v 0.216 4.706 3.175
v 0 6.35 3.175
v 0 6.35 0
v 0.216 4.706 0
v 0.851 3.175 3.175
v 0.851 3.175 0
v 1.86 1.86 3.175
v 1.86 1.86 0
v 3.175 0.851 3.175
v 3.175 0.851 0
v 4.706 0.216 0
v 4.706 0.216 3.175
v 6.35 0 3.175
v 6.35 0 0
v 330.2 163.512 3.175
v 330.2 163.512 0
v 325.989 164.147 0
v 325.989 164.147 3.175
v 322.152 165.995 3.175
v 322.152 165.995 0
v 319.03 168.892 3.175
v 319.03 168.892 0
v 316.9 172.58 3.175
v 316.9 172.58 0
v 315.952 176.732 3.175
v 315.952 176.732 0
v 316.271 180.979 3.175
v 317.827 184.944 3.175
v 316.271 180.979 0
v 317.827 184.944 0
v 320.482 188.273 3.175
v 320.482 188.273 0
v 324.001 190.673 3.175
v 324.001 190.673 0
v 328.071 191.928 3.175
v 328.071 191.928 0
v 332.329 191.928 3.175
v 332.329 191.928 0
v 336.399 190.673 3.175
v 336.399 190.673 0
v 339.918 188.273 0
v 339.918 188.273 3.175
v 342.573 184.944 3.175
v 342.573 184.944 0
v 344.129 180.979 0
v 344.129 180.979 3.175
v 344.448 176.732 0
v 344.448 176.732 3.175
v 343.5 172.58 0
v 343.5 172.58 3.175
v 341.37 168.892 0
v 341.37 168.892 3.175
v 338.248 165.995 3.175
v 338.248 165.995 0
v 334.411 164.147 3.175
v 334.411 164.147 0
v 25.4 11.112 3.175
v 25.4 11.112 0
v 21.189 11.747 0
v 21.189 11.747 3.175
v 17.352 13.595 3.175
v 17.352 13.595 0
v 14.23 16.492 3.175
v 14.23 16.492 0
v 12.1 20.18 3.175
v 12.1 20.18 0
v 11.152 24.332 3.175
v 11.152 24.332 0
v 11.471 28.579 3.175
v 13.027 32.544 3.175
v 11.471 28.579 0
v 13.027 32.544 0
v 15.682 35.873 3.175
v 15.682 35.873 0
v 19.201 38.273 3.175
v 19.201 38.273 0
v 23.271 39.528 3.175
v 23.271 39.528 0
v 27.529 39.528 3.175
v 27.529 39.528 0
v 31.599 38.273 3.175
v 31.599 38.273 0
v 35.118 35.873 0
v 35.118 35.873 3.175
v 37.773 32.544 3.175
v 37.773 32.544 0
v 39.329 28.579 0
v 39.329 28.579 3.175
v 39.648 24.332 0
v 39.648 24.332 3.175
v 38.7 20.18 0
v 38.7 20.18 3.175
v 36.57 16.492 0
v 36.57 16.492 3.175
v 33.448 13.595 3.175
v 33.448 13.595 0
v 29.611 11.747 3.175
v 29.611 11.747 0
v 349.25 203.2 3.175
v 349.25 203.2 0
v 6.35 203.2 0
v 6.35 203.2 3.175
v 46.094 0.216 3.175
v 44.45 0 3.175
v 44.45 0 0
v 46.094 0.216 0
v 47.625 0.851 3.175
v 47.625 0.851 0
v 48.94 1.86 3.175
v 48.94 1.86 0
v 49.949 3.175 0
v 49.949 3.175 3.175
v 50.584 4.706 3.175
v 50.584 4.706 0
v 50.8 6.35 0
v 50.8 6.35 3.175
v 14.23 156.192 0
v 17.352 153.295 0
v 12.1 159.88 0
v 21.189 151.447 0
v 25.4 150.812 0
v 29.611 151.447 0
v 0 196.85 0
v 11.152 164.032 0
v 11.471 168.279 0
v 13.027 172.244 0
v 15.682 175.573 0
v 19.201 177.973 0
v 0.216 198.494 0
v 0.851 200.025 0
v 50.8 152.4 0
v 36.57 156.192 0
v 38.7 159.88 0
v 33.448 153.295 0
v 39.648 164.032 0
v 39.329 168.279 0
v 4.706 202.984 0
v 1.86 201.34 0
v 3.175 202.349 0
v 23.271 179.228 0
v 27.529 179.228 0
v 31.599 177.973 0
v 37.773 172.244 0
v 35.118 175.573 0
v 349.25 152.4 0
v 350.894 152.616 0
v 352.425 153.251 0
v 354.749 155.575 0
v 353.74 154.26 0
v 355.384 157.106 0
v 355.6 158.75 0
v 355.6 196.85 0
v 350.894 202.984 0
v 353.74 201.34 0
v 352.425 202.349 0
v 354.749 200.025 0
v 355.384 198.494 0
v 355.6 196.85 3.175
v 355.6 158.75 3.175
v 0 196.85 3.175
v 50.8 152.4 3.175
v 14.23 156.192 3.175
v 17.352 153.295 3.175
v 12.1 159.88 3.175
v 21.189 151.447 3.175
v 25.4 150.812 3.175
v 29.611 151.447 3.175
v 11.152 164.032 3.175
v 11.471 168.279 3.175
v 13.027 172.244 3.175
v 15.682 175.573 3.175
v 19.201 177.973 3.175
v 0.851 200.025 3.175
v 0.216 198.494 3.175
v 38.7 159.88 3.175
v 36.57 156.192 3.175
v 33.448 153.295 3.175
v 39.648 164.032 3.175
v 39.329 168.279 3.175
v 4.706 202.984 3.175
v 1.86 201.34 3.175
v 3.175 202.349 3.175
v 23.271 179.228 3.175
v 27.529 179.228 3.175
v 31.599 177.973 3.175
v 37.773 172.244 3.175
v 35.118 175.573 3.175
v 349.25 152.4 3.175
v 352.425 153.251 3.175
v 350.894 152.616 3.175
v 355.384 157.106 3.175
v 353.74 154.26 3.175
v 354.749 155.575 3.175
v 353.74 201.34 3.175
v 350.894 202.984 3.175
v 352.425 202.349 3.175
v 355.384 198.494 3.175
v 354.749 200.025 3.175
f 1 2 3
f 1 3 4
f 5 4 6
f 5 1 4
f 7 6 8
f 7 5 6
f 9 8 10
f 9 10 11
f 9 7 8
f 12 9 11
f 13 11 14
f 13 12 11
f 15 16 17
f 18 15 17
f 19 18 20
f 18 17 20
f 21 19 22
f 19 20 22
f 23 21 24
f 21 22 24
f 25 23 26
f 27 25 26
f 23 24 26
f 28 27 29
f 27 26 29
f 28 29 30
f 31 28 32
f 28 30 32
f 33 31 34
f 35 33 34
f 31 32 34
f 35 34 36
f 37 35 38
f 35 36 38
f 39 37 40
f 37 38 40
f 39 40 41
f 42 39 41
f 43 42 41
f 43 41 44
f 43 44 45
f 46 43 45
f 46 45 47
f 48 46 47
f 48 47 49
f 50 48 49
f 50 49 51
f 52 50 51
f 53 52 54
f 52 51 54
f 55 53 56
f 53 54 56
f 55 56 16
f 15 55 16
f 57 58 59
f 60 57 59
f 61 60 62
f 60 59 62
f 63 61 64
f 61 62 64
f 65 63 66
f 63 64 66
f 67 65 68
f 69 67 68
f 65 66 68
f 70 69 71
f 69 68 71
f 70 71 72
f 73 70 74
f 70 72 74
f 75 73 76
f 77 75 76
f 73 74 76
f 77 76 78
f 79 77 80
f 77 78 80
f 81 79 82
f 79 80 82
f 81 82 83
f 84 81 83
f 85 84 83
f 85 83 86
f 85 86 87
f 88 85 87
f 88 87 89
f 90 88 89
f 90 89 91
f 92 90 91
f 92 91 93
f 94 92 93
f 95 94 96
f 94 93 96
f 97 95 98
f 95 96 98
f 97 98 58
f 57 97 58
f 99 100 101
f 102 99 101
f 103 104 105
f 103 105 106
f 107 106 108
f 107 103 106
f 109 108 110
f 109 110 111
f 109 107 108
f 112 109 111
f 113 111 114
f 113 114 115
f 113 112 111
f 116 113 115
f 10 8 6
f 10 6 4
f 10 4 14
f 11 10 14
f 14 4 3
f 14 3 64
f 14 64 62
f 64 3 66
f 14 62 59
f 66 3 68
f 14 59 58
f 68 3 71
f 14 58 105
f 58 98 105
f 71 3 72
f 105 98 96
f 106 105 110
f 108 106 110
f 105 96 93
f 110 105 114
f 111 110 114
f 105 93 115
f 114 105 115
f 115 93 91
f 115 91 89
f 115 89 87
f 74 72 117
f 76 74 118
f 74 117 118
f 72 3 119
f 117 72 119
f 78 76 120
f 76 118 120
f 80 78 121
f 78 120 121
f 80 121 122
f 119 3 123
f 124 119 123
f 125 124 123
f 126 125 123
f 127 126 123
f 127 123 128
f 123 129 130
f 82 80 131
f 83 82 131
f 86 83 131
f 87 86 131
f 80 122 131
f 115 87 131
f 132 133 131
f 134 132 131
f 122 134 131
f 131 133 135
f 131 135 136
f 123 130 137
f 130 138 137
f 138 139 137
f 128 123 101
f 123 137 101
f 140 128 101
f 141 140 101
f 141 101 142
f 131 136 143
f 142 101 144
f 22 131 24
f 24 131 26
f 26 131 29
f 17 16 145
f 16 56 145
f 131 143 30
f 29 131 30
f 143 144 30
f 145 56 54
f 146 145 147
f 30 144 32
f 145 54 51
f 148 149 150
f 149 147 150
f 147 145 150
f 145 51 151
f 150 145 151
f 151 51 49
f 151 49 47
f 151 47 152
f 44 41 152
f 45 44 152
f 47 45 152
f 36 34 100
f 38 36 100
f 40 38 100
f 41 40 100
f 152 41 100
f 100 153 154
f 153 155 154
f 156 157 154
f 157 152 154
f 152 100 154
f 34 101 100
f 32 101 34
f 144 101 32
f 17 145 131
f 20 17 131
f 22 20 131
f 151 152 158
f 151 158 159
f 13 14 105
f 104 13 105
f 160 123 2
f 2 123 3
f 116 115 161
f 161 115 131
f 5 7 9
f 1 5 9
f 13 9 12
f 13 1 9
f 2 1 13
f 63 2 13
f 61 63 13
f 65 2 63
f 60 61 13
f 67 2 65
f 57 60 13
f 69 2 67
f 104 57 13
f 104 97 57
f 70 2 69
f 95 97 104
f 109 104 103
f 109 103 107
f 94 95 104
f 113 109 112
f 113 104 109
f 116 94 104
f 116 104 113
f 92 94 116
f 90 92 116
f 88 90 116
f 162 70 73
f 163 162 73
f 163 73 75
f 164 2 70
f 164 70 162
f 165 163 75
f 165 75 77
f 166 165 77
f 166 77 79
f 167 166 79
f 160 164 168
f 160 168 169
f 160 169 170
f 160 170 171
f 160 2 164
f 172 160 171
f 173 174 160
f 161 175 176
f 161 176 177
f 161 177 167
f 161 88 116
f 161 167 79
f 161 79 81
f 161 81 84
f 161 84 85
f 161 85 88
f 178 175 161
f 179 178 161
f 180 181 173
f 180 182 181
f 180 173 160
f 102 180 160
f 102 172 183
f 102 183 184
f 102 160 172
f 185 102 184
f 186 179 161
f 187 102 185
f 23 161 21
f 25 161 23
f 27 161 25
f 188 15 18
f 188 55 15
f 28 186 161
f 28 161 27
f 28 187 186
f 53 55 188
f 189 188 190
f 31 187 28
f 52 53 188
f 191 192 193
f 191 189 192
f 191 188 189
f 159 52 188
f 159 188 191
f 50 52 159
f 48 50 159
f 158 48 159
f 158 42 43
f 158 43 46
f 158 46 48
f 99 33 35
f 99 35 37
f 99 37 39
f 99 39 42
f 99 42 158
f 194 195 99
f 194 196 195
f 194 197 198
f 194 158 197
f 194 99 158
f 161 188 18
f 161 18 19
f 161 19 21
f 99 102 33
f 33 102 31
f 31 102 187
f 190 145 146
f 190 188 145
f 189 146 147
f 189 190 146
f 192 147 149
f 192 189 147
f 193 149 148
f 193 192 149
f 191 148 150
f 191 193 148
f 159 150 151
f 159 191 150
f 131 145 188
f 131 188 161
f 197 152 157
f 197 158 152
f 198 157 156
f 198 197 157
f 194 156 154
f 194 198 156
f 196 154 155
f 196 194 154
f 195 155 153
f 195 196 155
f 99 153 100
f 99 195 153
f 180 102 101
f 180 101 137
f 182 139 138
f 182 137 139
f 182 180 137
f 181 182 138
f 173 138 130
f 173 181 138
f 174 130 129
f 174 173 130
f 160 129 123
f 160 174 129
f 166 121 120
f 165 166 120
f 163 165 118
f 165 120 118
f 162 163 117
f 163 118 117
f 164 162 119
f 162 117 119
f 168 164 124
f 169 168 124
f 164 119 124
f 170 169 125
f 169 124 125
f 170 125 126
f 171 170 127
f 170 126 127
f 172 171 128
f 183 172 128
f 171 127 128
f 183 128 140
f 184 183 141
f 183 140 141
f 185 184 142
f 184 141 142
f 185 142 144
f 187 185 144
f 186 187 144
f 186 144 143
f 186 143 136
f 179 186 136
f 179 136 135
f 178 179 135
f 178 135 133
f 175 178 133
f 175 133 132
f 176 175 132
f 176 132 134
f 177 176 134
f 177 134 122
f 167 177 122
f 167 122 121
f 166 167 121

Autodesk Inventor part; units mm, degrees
ref_plane "YZ Plane" through (0, 0, 0) normal (1, 0, 0) x (0, 1, 0)
ref_plane "XZ Plane" through (0, 0, 0) normal (0, 1, 0) x (-1, 0, 0)
ref_plane "XY Plane" through (0, 0, 0) normal (0, 0, 1) x (1, 0, 0)
sketch "Sketch1" plane through (0, 0, 0) normal (0, 0, 1) x (1, 0, 0)
  line L0 (0, 0) -> (50.8, 0)
  line L1 (50.8, 0) -> (50.8, 152.4)
  line L2 (50.8, 203.2) -> (0, 203.2)
  line L3 (0, 203.2) -> (0, 0)
  line L4 (0, 203.2) -> (355.6, 203.2)
  line L5 (355.6, 203.2) -> (355.6, 152.4)
  line L6 (355.6, 152.4) -> (50.8, 152.4)
  line L7 (0, 152.4) -> (0, 203.2)
  dimension "d0" = 50.8
  dimension "d1" = 203.2
  dimension "d2" = 355.6
  dimension "d3" = 50.8
extrude "Extrusion1" add sketch "Sketch1" along normal blind 3.175
sketch "Sketch2" plane through (0, 0, 3.175) normal (0, 0, 1) x (1, 0, 0)
  line L0 (355.6, 203.2) -> (0, 203.2) projected
  line L1 (0, 203.2) -> (0, 0) projected
  point P0 (25.4, 165.1)
  dimension "d20" = 38.1
  dimension "d21" = 25.4
hole "Hole1" at (25.4, 165.1, 3.175) direction (0, 0, -1) diameter 28.575 end through all
sketch "Sketch3" plane through (0, 0, 3.175) normal (0, 0, 1) x (1, 0, 0)
  line L0 (50.8, 0) -> (50.8, 152.4) projected
  line L1 (0, 0) -> (50.8, 0) projected
  point P0 (25.4, 25.4)
  dimension "d22" = 25.4
  dimension "d23" = 25.4
hole "Hole2" at (25.4, 25.4, 3.175) direction (0, 0, -1) diameter 28.575 end through all
fillet "Fillet1" radius 6.35 5 edges at (355.6, 152.4, 1.5875) (355.6, 203.2, 1.5875) (50.8, 0, 1.5875) (0, 0, 1.5875) (0, 203.2, 1.5875)
sketch "Sketch4" plane through (0, 0, 3.175) normal (0, 0, 1) x (1, 0, 0)
  line L0 (349.25, 203.2) -> (6.35, 203.2) projected
  line L1 (355.6, 158.75) -> (355.6, 196.85) projected
  point P0 (0, 0)
  point P1 (330.2, 177.8)
  dimension "d32" = 25.4
  dimension "d33" = 25.4
hole "Hole3" at (330.2, 177.8, 3.175) direction (0, 0, -1) diameter 28.575 end through all
properties part number "Arm"
